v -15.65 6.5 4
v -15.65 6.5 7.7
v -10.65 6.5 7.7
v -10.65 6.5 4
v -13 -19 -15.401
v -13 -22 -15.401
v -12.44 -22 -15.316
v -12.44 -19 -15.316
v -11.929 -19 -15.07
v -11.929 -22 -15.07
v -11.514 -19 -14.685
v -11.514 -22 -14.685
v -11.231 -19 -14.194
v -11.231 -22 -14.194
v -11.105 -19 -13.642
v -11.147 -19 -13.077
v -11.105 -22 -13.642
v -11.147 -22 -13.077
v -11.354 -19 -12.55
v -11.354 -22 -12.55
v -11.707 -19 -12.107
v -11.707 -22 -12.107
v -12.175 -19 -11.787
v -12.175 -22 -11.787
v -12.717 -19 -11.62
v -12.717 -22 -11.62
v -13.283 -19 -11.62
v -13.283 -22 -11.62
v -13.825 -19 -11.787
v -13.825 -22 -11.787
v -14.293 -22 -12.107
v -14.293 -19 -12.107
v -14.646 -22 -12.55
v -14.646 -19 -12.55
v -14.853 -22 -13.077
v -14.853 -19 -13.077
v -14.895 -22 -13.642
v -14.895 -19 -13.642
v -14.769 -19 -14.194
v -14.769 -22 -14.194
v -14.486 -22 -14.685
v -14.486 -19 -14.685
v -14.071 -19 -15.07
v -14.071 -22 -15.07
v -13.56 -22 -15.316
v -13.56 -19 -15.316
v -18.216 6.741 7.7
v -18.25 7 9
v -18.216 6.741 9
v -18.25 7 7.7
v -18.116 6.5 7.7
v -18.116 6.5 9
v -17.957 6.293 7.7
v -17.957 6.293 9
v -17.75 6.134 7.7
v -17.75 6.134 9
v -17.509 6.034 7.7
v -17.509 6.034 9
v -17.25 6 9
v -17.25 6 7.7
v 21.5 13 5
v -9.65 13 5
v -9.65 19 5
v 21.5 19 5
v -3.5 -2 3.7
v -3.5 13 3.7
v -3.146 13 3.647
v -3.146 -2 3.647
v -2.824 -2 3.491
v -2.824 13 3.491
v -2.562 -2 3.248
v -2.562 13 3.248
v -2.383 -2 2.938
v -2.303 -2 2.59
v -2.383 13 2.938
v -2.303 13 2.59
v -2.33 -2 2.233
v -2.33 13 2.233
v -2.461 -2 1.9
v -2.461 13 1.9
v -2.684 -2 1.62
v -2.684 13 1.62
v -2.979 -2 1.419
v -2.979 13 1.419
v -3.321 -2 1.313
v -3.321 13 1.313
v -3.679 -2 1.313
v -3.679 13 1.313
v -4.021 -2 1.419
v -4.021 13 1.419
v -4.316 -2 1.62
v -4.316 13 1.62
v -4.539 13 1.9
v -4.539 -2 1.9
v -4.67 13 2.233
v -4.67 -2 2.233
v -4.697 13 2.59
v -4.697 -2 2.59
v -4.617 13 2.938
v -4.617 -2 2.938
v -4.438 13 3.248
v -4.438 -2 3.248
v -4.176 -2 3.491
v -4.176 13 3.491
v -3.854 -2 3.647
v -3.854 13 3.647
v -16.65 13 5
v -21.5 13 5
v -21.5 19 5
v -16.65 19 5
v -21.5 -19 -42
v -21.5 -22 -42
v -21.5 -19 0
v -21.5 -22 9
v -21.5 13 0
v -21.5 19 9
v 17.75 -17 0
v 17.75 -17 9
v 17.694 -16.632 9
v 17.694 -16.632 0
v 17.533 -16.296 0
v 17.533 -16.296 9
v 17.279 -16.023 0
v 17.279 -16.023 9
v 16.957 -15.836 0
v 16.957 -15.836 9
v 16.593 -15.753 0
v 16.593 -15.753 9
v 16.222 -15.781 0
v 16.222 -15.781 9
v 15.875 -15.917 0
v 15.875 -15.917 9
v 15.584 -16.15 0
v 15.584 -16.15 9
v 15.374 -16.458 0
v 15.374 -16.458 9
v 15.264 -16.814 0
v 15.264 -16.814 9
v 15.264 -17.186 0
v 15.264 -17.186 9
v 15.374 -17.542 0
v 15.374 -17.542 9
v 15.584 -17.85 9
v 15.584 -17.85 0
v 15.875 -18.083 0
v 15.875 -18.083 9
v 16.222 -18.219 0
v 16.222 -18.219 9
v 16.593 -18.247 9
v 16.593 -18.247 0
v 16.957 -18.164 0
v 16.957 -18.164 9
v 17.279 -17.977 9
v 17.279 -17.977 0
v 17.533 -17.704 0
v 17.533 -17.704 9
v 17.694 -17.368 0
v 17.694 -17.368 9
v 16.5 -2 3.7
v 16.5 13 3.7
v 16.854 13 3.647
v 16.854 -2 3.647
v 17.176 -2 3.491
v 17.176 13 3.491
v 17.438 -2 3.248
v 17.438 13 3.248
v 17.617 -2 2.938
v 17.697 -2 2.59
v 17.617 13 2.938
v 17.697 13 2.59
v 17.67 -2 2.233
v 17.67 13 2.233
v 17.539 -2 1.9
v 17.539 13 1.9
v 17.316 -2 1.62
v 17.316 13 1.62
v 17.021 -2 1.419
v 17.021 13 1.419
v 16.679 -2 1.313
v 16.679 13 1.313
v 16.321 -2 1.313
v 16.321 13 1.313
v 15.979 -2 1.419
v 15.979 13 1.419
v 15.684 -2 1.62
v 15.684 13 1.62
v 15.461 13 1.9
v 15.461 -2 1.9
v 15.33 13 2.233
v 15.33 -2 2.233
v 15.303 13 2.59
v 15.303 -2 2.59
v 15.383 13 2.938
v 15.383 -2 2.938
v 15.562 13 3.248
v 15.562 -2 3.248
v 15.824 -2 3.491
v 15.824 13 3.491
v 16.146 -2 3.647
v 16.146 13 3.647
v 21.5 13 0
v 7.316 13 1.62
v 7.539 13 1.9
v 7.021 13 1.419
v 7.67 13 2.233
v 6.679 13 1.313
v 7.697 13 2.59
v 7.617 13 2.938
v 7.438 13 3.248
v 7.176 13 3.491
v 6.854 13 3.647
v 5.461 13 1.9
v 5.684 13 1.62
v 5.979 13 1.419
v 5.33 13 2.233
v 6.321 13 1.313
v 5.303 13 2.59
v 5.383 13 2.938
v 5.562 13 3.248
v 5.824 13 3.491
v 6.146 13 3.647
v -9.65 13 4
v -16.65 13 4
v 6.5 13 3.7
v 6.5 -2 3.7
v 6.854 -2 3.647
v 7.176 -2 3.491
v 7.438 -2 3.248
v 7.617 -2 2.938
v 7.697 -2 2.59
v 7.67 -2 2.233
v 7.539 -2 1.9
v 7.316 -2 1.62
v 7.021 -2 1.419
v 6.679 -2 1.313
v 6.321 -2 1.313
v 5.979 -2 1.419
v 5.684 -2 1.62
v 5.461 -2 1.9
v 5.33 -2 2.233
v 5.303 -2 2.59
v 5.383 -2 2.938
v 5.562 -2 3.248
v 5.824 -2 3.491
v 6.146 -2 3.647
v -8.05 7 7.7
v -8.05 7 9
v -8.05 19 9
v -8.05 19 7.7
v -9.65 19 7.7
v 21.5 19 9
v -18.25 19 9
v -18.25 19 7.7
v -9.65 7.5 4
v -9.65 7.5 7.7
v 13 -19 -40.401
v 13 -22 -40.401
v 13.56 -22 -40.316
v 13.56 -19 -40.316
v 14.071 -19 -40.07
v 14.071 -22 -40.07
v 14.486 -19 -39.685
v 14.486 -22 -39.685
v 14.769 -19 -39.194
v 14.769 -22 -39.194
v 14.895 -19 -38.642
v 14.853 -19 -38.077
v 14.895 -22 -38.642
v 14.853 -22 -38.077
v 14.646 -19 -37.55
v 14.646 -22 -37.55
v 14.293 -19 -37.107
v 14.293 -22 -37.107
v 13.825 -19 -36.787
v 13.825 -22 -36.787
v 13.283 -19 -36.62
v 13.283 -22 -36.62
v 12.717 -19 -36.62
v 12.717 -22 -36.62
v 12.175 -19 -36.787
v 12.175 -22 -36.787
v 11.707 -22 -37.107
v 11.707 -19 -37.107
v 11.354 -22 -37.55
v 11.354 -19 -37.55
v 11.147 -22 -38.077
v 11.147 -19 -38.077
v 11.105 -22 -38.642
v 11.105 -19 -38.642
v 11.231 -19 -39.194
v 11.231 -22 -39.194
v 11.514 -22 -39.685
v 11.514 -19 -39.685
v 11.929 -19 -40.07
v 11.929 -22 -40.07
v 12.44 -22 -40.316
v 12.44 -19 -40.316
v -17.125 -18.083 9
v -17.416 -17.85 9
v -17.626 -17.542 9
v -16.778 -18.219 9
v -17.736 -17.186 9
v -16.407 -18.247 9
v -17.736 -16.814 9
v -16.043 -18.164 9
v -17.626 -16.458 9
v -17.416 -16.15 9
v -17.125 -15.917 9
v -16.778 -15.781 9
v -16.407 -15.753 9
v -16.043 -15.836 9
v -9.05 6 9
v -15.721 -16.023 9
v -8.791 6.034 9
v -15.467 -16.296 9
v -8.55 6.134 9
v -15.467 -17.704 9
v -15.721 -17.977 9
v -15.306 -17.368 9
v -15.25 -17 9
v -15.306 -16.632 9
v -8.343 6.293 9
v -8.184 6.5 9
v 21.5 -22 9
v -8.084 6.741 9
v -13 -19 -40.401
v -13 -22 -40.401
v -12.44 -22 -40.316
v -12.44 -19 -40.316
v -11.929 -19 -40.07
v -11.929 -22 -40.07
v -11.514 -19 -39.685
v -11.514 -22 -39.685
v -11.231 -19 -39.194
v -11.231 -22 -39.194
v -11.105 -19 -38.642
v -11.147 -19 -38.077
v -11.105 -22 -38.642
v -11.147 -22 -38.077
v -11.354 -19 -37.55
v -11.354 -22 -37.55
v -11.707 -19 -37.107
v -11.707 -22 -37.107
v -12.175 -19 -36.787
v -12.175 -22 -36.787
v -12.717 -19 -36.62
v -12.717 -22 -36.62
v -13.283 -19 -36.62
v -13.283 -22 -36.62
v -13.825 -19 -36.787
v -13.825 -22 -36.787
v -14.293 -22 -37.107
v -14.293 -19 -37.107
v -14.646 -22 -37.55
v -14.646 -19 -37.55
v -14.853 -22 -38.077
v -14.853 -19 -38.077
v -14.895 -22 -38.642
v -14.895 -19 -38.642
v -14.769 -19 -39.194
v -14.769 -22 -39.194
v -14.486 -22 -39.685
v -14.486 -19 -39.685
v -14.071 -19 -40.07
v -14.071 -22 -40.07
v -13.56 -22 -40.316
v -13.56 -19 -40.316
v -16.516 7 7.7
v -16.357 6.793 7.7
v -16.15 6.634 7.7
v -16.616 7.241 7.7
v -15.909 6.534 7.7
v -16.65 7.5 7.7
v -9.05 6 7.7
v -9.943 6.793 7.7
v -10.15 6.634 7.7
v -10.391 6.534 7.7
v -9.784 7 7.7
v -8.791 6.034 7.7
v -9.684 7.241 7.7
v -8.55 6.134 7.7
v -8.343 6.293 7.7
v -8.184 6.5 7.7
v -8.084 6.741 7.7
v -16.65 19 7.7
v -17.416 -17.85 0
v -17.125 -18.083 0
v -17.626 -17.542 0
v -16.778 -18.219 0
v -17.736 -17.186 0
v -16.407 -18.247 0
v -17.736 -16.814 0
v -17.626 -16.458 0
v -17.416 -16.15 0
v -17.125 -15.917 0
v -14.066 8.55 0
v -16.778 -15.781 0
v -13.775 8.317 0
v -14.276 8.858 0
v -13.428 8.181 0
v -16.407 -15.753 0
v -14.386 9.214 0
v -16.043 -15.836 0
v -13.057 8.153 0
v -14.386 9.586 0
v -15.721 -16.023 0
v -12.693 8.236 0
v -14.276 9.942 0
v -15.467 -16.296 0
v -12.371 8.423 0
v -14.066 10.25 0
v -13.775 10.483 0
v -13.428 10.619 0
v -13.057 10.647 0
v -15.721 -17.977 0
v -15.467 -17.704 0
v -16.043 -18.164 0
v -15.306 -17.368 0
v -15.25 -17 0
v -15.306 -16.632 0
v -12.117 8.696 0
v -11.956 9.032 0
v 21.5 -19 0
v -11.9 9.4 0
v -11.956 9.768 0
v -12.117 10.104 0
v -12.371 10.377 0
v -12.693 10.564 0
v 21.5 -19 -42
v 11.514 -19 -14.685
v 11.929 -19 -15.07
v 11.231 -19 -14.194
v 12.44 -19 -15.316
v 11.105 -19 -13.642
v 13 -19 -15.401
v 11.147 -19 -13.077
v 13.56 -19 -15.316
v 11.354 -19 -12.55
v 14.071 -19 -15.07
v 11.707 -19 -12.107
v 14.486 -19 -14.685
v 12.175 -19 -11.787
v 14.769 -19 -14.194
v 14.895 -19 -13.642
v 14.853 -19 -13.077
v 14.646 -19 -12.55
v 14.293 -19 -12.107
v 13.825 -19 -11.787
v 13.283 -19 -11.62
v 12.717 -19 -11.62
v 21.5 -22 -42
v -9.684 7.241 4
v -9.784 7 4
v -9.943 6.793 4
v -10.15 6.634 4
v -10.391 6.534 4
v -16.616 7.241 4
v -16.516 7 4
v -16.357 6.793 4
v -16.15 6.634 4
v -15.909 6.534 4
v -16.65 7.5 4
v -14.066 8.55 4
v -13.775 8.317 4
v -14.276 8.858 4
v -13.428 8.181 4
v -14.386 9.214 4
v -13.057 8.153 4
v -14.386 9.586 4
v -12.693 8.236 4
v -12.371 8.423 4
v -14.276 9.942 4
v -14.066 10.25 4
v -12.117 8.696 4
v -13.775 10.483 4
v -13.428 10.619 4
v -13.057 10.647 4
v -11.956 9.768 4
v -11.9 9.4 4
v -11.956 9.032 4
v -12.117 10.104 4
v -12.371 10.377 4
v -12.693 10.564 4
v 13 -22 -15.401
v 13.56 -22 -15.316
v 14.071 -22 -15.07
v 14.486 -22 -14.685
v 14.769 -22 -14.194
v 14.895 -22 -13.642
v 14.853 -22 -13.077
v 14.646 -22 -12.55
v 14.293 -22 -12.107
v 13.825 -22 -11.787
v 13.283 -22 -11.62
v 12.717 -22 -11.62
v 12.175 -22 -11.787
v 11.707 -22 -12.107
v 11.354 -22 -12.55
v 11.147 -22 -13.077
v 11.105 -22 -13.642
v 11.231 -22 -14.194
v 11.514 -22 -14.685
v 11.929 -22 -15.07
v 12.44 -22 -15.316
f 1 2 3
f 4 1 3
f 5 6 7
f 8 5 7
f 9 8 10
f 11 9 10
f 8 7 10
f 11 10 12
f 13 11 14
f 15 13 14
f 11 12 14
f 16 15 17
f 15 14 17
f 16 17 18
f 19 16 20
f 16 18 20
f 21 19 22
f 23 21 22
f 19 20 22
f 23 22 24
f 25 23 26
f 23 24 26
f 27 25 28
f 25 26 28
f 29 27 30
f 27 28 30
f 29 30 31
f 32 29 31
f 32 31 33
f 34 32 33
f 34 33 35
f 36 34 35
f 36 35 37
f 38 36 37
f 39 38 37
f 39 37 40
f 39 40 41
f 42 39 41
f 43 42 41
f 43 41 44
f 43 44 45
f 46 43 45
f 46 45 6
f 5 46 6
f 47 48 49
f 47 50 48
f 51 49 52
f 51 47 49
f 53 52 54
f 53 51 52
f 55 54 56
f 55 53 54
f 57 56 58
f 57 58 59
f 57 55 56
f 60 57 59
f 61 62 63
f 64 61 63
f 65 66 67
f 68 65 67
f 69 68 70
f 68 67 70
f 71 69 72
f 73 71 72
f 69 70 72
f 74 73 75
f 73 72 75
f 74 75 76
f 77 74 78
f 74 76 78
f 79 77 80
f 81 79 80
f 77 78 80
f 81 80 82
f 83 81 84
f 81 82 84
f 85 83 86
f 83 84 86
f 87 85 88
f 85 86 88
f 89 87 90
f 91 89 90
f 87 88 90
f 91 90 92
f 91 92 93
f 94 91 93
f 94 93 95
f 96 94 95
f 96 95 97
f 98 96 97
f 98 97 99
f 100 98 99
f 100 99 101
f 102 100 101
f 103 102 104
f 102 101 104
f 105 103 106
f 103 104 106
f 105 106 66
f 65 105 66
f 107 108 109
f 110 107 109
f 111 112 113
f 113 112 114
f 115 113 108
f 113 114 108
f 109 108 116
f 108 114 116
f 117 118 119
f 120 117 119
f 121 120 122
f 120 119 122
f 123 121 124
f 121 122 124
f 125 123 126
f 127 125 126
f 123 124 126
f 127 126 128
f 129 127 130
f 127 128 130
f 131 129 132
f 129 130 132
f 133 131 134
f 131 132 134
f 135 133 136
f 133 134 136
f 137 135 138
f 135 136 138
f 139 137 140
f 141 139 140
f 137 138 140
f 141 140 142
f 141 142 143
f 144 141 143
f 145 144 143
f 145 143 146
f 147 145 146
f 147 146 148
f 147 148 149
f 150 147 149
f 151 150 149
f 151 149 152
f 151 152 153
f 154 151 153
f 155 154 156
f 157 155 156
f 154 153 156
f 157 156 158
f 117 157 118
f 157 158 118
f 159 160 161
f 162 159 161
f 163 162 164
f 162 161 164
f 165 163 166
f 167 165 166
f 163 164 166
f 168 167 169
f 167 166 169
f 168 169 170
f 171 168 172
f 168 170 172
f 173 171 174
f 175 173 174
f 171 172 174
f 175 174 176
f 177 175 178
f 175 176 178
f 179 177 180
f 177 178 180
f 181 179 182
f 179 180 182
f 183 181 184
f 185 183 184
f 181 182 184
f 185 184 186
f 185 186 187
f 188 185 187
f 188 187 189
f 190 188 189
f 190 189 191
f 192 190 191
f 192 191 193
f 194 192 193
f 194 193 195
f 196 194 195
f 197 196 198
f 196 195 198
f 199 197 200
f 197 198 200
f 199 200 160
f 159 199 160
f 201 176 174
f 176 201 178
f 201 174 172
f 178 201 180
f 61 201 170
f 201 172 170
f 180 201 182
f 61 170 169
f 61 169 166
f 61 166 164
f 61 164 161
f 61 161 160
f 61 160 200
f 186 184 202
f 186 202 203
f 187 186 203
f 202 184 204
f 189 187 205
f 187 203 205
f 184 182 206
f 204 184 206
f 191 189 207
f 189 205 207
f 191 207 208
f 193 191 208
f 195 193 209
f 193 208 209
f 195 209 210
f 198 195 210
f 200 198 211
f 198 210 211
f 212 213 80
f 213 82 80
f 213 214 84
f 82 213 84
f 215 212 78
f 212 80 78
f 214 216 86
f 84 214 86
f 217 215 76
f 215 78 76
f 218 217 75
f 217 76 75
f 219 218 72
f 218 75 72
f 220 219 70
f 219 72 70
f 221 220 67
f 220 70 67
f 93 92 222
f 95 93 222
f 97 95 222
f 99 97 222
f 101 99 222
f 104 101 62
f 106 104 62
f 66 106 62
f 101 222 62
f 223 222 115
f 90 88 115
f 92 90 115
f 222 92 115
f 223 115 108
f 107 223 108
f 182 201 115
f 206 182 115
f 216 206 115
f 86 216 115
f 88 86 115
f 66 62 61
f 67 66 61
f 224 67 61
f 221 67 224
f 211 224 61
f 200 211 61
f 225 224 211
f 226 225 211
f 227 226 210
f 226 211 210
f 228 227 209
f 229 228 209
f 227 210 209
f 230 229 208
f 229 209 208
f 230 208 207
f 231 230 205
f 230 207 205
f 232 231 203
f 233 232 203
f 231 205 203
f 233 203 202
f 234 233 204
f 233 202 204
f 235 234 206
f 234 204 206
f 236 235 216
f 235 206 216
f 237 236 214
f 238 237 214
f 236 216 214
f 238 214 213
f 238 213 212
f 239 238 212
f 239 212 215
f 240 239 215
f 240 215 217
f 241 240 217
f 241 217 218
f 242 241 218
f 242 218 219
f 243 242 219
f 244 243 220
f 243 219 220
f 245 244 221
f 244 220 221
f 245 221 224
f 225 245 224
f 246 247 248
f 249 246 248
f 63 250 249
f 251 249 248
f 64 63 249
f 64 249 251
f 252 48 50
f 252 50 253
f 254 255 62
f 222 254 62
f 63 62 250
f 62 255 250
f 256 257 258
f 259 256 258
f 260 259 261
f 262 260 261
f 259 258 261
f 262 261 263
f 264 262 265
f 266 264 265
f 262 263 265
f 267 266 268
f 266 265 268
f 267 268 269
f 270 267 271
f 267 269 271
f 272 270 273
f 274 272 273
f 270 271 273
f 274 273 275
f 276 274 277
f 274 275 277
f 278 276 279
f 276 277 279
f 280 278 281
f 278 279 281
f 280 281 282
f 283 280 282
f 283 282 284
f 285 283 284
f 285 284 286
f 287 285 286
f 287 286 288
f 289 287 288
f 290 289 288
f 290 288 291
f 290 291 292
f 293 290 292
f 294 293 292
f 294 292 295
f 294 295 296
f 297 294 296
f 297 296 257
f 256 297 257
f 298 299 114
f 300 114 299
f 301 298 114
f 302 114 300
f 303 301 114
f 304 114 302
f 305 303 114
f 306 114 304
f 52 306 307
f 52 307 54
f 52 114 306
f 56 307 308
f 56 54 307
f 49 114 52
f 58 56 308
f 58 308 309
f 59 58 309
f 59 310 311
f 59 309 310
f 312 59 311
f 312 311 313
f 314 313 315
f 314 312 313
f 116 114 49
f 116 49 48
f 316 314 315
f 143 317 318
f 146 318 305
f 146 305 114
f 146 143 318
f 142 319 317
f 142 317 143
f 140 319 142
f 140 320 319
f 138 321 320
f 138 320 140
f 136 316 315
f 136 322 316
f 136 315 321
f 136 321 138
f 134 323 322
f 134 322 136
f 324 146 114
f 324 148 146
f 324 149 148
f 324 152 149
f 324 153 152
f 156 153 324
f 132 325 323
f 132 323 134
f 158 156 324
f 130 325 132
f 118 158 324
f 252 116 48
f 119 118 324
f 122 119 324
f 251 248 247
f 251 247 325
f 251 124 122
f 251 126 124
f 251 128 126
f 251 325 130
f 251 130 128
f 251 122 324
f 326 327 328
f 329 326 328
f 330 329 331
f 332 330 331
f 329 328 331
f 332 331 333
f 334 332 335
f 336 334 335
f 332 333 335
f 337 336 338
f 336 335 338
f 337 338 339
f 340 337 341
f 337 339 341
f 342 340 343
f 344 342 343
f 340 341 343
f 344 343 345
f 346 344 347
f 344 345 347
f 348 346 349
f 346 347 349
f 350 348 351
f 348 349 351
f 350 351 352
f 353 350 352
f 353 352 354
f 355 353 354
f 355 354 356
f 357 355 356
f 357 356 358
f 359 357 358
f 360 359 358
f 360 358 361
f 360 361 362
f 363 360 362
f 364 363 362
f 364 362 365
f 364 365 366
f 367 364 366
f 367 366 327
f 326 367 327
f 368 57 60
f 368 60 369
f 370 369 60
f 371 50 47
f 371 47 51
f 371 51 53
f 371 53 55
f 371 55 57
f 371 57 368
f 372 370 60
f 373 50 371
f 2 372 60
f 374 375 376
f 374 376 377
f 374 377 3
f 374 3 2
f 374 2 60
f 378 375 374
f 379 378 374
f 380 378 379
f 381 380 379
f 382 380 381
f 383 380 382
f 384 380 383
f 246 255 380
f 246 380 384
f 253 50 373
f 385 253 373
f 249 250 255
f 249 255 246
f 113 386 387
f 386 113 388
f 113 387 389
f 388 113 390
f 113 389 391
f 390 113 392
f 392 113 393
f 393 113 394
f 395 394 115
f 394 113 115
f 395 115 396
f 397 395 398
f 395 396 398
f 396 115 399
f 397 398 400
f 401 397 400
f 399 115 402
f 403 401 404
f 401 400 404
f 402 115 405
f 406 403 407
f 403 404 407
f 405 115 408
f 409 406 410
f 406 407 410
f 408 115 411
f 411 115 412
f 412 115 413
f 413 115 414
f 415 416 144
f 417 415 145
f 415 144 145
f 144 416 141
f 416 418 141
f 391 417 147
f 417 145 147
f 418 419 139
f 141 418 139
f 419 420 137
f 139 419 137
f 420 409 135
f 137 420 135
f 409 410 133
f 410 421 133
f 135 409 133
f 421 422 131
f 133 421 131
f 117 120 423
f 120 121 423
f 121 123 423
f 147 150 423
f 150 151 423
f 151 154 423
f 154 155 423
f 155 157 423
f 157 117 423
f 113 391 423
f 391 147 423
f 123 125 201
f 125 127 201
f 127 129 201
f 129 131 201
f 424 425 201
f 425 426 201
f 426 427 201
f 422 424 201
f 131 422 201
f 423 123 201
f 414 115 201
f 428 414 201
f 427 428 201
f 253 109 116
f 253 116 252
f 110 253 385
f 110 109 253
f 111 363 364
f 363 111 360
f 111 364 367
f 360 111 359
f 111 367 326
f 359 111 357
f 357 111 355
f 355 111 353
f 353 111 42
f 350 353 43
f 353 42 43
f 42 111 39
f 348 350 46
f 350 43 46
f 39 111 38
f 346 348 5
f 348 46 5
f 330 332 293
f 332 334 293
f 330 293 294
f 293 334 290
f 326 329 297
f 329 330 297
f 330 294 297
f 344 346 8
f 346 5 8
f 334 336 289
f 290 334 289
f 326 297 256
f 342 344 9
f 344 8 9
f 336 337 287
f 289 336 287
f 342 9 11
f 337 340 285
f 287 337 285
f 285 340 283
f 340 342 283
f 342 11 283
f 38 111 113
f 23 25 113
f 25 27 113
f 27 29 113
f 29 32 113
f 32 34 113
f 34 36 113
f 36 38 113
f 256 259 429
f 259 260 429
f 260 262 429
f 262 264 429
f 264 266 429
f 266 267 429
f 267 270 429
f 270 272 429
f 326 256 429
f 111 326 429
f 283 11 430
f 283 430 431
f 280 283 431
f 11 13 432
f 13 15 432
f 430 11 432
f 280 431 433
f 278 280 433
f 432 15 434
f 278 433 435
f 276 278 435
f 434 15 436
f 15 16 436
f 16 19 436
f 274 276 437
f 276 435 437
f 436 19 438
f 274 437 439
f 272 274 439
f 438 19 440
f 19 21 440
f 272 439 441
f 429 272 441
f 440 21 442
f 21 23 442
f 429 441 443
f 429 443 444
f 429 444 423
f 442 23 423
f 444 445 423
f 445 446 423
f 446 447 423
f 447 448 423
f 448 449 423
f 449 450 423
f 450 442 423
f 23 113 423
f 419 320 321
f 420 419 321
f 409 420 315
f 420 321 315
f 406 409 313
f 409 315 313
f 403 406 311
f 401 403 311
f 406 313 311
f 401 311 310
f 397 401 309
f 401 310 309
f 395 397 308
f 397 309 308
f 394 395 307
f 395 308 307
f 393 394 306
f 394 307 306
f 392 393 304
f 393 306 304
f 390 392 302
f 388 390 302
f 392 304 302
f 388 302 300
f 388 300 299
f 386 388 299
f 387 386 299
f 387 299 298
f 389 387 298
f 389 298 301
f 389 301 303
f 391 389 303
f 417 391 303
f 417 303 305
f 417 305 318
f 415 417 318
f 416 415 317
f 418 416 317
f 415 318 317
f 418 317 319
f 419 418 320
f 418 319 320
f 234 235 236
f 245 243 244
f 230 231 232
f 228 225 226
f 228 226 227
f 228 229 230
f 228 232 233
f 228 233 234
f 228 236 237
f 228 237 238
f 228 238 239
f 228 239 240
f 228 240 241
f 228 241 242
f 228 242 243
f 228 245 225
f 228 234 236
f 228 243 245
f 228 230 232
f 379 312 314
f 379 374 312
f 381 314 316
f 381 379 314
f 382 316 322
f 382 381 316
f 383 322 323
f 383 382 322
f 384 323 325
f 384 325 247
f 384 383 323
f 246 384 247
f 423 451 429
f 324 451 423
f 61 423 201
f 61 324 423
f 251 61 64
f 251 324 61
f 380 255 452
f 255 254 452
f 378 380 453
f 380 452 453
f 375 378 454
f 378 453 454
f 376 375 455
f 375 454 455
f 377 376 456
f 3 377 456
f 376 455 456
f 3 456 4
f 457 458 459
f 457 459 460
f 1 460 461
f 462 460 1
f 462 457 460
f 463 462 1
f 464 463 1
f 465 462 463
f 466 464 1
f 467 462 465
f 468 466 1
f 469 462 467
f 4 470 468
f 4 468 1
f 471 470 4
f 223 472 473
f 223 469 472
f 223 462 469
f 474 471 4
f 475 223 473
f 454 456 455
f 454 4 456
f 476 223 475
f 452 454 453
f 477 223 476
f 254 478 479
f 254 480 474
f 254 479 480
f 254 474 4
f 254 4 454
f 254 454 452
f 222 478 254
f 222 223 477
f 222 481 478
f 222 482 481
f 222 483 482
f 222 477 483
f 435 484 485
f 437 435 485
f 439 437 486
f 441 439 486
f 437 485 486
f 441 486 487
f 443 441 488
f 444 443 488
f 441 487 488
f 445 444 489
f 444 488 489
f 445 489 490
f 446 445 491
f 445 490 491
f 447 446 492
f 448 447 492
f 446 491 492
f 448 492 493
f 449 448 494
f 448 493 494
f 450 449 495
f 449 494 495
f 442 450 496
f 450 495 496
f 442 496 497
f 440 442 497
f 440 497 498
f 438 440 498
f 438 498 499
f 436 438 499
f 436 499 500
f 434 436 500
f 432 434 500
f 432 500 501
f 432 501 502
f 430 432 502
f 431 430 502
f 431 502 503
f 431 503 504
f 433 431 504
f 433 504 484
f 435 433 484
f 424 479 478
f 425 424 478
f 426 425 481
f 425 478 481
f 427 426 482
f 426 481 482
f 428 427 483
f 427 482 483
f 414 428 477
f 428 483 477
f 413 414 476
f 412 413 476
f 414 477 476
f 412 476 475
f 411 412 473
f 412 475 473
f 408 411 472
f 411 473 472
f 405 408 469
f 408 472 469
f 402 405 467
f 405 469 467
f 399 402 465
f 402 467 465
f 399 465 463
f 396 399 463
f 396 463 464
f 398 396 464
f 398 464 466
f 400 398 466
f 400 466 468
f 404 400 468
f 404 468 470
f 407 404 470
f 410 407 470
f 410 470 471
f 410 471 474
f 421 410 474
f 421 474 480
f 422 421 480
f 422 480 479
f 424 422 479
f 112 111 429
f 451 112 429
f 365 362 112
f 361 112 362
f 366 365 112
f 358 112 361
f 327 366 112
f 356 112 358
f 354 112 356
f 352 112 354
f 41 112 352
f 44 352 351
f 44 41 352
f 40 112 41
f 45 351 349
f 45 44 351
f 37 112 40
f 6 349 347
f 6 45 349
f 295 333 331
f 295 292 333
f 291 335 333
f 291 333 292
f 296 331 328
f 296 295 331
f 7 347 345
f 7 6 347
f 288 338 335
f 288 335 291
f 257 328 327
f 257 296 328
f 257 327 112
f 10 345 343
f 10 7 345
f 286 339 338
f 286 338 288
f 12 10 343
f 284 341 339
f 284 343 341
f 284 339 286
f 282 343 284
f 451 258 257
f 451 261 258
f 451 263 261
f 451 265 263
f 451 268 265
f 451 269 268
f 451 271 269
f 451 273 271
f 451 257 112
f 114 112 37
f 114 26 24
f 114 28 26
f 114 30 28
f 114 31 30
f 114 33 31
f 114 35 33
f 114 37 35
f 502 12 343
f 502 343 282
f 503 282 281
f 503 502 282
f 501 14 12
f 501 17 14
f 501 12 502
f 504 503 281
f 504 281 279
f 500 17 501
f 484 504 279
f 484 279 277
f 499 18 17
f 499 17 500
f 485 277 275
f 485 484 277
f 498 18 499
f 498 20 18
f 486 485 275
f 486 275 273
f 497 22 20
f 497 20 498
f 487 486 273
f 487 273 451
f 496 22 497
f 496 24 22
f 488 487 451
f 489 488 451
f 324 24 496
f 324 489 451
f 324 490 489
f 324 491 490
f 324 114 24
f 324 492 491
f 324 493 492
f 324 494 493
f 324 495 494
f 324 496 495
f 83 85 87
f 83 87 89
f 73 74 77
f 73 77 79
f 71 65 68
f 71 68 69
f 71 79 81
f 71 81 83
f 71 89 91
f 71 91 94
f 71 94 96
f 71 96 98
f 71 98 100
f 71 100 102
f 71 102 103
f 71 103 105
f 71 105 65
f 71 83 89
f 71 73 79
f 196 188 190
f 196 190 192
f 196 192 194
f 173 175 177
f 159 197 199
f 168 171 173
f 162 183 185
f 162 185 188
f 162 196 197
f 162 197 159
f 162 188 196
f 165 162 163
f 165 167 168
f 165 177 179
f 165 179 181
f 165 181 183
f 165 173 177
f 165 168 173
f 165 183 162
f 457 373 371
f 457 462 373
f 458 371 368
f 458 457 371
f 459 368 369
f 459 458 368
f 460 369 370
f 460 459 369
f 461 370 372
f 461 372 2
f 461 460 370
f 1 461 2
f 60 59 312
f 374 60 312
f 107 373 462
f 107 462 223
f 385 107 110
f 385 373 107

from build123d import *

# Parameters (mm, degrees)
SKETCH_1_W           = 43
SKETCH_1_H           = 38
EXTRUDE_1_DEPTH      = 9
SKETCH_2_W           = 43
SKETCH_2_H           = 3
EXTRUDE_3_DEPTH      = 51
SKETCH_3_R           = 1.900733336
CUT_EXTRUDE_1_DEPTH  = 42
SKETCH_4_W           = 5
SKETCH_4_H           = 6
CUT_EXTRUDE_2_DEPTH  = 44
SKETCH_8_R           = 1.25
CUT_EXTRUDE_6_DEPTH  = 9
SKETCH_7_R           = 1.2
CUT_EXTRUDE_7_DEPTH  = 15
SKETCH_9_W           = 10.2
SKETCH_9_H           = 13
CUT_EXTRUDE_8_DEPTH  = 1.3
SKETCH_11_W          = 7
SKETCH_11_H          = 12.5
CUT_EXTRUDE_13_DEPTH = 3.7
SKETCH_10_R          = 1.25
CUT_EXTRUDE_14_DEPTH = 8
FILLET_1_R           = 1
FILLET_2_R           = 1


with BuildPart() as part:
    # Эскиз1 → Бобышка-Вытянуть1 (new body)
    with BuildSketch(Plane.XY):
        Rectangle(SKETCH_1_W, SKETCH_1_H)
    extrude(amount=EXTRUDE_1_DEPTH)

    # Эскиз2 → Бобышка-Вытянуть3 (add)
    with BuildSketch(Plane.XY.offset(9)):
        with Locations((0, -20.5)):
            Rectangle(SKETCH_2_W, SKETCH_2_H)
    extrude(amount=-EXTRUDE_3_DEPTH)

    # Эскиз3 → Вырез-Вытянуть1 (cut, through all)
    with BuildSketch(Plane.XZ.offset(22)):
        with Locations(Location((-13, -38.5, 0), (0, 0, 270))):  # turned: the seam where the file's is
            Circle(SKETCH_3_R)
        with Locations(Location((13, -38.5, 0), (0, 0, 270))):  # turned: the seam where the file's is
            Circle(SKETCH_3_R)
        with Locations(Location((13, -13.5, 0), (0, 0, 270))):  # turned: the seam where the file's is
            Circle(SKETCH_3_R)
        with Locations(Location((-13, -13.5, 0), (0, 0, 270))):  # turned: the seam where the file's is
            Circle(SKETCH_3_R)
    extrude(amount=-CUT_EXTRUDE_1_DEPTH, mode=Mode.SUBTRACT)

    # Эскиз4 → Вырез-Вытянуть2 (cut, through all)
    with BuildSketch(Plane.ZY.offset(21.5)):
        with Locations((2.5, 16)):
            Rectangle(SKETCH_4_W, SKETCH_4_H)
    extrude(amount=-CUT_EXTRUDE_2_DEPTH, mode=Mode.SUBTRACT)

    # Эскиз8 → Вырез-Вытянуть6 (cut)
    with BuildSketch(Plane.XY.offset(9)):
        with Locations((16.5, -17)):
            Circle(SKETCH_8_R)
        with Locations((-16.5, -17)):
            Circle(SKETCH_8_R)
    extrude(amount=-CUT_EXTRUDE_6_DEPTH, mode=Mode.SUBTRACT)

    # Эскиз7 → Вырез-Вытянуть7 (cut)
    with BuildSketch(Plane(origin=(0, 13, 0), x_dir=(1, 0, 0), z_dir=(0, 1, 0))):
        with Locations(Location((16.5, -2.5, 0), (0, 0, 270))):  # turned: the seam where the file's is
            Circle(SKETCH_7_R)
        with Locations(Location((6.5, -2.5, 0), (0, 0, 270))):  # turned: the seam where the file's is
            Circle(SKETCH_7_R)
        with Locations(Location((-3.5, -2.5, 0), (0, 0, 270))):  # turned: the seam where the file's is
            Circle(SKETCH_7_R)
    extrude(amount=-CUT_EXTRUDE_7_DEPTH, mode=Mode.SUBTRACT)

    # Эскиз9 → Вырез-Вытянуть8 (cut)
    with BuildSketch(Plane.XY.offset(9)):
        with Locations((-13.15, 12.5)):
            Rectangle(SKETCH_9_W, SKETCH_9_H)
    extrude(amount=-CUT_EXTRUDE_8_DEPTH, mode=Mode.SUBTRACT)

    # Эскиз11 → Вырез-Вытянуть13 (cut)
    with BuildSketch(Plane.XY.offset(7.7)):
        with Locations((-13.15, 12.75)):
            Rectangle(SKETCH_11_W, SKETCH_11_H)
    extrude(amount=-CUT_EXTRUDE_13_DEPTH, mode=Mode.SUBTRACT)

    # Эскиз10 → Вырез-Вытянуть14 (cut)
    with BuildSketch(Plane.XY.offset(7.7)):
        with Locations((-13.149995044, 9.4)):
            Circle(SKETCH_10_R)
    extrude(amount=-CUT_EXTRUDE_14_DEPTH, mode=Mode.SUBTRACT)

    # Скругление1
    fillet_1_edges = [part.edges().sort_by_distance(p)[0] for p in [
        (-16.65, 6.5, 5.85),
        (-9.65, 6.5, 5.85),
    ]]
    fillet(fillet_1_edges, radius=FILLET_1_R)

    # Скругление2
    fillet_2_edges = [part.edges().sort_by_distance(p)[0] for p in [
        (-8.05, 6, 8.35),
        (-18.25, 6, 8.35),
    ]]
    fillet(fillet_2_edges, radius=FILLET_2_R)


solid = part.part
